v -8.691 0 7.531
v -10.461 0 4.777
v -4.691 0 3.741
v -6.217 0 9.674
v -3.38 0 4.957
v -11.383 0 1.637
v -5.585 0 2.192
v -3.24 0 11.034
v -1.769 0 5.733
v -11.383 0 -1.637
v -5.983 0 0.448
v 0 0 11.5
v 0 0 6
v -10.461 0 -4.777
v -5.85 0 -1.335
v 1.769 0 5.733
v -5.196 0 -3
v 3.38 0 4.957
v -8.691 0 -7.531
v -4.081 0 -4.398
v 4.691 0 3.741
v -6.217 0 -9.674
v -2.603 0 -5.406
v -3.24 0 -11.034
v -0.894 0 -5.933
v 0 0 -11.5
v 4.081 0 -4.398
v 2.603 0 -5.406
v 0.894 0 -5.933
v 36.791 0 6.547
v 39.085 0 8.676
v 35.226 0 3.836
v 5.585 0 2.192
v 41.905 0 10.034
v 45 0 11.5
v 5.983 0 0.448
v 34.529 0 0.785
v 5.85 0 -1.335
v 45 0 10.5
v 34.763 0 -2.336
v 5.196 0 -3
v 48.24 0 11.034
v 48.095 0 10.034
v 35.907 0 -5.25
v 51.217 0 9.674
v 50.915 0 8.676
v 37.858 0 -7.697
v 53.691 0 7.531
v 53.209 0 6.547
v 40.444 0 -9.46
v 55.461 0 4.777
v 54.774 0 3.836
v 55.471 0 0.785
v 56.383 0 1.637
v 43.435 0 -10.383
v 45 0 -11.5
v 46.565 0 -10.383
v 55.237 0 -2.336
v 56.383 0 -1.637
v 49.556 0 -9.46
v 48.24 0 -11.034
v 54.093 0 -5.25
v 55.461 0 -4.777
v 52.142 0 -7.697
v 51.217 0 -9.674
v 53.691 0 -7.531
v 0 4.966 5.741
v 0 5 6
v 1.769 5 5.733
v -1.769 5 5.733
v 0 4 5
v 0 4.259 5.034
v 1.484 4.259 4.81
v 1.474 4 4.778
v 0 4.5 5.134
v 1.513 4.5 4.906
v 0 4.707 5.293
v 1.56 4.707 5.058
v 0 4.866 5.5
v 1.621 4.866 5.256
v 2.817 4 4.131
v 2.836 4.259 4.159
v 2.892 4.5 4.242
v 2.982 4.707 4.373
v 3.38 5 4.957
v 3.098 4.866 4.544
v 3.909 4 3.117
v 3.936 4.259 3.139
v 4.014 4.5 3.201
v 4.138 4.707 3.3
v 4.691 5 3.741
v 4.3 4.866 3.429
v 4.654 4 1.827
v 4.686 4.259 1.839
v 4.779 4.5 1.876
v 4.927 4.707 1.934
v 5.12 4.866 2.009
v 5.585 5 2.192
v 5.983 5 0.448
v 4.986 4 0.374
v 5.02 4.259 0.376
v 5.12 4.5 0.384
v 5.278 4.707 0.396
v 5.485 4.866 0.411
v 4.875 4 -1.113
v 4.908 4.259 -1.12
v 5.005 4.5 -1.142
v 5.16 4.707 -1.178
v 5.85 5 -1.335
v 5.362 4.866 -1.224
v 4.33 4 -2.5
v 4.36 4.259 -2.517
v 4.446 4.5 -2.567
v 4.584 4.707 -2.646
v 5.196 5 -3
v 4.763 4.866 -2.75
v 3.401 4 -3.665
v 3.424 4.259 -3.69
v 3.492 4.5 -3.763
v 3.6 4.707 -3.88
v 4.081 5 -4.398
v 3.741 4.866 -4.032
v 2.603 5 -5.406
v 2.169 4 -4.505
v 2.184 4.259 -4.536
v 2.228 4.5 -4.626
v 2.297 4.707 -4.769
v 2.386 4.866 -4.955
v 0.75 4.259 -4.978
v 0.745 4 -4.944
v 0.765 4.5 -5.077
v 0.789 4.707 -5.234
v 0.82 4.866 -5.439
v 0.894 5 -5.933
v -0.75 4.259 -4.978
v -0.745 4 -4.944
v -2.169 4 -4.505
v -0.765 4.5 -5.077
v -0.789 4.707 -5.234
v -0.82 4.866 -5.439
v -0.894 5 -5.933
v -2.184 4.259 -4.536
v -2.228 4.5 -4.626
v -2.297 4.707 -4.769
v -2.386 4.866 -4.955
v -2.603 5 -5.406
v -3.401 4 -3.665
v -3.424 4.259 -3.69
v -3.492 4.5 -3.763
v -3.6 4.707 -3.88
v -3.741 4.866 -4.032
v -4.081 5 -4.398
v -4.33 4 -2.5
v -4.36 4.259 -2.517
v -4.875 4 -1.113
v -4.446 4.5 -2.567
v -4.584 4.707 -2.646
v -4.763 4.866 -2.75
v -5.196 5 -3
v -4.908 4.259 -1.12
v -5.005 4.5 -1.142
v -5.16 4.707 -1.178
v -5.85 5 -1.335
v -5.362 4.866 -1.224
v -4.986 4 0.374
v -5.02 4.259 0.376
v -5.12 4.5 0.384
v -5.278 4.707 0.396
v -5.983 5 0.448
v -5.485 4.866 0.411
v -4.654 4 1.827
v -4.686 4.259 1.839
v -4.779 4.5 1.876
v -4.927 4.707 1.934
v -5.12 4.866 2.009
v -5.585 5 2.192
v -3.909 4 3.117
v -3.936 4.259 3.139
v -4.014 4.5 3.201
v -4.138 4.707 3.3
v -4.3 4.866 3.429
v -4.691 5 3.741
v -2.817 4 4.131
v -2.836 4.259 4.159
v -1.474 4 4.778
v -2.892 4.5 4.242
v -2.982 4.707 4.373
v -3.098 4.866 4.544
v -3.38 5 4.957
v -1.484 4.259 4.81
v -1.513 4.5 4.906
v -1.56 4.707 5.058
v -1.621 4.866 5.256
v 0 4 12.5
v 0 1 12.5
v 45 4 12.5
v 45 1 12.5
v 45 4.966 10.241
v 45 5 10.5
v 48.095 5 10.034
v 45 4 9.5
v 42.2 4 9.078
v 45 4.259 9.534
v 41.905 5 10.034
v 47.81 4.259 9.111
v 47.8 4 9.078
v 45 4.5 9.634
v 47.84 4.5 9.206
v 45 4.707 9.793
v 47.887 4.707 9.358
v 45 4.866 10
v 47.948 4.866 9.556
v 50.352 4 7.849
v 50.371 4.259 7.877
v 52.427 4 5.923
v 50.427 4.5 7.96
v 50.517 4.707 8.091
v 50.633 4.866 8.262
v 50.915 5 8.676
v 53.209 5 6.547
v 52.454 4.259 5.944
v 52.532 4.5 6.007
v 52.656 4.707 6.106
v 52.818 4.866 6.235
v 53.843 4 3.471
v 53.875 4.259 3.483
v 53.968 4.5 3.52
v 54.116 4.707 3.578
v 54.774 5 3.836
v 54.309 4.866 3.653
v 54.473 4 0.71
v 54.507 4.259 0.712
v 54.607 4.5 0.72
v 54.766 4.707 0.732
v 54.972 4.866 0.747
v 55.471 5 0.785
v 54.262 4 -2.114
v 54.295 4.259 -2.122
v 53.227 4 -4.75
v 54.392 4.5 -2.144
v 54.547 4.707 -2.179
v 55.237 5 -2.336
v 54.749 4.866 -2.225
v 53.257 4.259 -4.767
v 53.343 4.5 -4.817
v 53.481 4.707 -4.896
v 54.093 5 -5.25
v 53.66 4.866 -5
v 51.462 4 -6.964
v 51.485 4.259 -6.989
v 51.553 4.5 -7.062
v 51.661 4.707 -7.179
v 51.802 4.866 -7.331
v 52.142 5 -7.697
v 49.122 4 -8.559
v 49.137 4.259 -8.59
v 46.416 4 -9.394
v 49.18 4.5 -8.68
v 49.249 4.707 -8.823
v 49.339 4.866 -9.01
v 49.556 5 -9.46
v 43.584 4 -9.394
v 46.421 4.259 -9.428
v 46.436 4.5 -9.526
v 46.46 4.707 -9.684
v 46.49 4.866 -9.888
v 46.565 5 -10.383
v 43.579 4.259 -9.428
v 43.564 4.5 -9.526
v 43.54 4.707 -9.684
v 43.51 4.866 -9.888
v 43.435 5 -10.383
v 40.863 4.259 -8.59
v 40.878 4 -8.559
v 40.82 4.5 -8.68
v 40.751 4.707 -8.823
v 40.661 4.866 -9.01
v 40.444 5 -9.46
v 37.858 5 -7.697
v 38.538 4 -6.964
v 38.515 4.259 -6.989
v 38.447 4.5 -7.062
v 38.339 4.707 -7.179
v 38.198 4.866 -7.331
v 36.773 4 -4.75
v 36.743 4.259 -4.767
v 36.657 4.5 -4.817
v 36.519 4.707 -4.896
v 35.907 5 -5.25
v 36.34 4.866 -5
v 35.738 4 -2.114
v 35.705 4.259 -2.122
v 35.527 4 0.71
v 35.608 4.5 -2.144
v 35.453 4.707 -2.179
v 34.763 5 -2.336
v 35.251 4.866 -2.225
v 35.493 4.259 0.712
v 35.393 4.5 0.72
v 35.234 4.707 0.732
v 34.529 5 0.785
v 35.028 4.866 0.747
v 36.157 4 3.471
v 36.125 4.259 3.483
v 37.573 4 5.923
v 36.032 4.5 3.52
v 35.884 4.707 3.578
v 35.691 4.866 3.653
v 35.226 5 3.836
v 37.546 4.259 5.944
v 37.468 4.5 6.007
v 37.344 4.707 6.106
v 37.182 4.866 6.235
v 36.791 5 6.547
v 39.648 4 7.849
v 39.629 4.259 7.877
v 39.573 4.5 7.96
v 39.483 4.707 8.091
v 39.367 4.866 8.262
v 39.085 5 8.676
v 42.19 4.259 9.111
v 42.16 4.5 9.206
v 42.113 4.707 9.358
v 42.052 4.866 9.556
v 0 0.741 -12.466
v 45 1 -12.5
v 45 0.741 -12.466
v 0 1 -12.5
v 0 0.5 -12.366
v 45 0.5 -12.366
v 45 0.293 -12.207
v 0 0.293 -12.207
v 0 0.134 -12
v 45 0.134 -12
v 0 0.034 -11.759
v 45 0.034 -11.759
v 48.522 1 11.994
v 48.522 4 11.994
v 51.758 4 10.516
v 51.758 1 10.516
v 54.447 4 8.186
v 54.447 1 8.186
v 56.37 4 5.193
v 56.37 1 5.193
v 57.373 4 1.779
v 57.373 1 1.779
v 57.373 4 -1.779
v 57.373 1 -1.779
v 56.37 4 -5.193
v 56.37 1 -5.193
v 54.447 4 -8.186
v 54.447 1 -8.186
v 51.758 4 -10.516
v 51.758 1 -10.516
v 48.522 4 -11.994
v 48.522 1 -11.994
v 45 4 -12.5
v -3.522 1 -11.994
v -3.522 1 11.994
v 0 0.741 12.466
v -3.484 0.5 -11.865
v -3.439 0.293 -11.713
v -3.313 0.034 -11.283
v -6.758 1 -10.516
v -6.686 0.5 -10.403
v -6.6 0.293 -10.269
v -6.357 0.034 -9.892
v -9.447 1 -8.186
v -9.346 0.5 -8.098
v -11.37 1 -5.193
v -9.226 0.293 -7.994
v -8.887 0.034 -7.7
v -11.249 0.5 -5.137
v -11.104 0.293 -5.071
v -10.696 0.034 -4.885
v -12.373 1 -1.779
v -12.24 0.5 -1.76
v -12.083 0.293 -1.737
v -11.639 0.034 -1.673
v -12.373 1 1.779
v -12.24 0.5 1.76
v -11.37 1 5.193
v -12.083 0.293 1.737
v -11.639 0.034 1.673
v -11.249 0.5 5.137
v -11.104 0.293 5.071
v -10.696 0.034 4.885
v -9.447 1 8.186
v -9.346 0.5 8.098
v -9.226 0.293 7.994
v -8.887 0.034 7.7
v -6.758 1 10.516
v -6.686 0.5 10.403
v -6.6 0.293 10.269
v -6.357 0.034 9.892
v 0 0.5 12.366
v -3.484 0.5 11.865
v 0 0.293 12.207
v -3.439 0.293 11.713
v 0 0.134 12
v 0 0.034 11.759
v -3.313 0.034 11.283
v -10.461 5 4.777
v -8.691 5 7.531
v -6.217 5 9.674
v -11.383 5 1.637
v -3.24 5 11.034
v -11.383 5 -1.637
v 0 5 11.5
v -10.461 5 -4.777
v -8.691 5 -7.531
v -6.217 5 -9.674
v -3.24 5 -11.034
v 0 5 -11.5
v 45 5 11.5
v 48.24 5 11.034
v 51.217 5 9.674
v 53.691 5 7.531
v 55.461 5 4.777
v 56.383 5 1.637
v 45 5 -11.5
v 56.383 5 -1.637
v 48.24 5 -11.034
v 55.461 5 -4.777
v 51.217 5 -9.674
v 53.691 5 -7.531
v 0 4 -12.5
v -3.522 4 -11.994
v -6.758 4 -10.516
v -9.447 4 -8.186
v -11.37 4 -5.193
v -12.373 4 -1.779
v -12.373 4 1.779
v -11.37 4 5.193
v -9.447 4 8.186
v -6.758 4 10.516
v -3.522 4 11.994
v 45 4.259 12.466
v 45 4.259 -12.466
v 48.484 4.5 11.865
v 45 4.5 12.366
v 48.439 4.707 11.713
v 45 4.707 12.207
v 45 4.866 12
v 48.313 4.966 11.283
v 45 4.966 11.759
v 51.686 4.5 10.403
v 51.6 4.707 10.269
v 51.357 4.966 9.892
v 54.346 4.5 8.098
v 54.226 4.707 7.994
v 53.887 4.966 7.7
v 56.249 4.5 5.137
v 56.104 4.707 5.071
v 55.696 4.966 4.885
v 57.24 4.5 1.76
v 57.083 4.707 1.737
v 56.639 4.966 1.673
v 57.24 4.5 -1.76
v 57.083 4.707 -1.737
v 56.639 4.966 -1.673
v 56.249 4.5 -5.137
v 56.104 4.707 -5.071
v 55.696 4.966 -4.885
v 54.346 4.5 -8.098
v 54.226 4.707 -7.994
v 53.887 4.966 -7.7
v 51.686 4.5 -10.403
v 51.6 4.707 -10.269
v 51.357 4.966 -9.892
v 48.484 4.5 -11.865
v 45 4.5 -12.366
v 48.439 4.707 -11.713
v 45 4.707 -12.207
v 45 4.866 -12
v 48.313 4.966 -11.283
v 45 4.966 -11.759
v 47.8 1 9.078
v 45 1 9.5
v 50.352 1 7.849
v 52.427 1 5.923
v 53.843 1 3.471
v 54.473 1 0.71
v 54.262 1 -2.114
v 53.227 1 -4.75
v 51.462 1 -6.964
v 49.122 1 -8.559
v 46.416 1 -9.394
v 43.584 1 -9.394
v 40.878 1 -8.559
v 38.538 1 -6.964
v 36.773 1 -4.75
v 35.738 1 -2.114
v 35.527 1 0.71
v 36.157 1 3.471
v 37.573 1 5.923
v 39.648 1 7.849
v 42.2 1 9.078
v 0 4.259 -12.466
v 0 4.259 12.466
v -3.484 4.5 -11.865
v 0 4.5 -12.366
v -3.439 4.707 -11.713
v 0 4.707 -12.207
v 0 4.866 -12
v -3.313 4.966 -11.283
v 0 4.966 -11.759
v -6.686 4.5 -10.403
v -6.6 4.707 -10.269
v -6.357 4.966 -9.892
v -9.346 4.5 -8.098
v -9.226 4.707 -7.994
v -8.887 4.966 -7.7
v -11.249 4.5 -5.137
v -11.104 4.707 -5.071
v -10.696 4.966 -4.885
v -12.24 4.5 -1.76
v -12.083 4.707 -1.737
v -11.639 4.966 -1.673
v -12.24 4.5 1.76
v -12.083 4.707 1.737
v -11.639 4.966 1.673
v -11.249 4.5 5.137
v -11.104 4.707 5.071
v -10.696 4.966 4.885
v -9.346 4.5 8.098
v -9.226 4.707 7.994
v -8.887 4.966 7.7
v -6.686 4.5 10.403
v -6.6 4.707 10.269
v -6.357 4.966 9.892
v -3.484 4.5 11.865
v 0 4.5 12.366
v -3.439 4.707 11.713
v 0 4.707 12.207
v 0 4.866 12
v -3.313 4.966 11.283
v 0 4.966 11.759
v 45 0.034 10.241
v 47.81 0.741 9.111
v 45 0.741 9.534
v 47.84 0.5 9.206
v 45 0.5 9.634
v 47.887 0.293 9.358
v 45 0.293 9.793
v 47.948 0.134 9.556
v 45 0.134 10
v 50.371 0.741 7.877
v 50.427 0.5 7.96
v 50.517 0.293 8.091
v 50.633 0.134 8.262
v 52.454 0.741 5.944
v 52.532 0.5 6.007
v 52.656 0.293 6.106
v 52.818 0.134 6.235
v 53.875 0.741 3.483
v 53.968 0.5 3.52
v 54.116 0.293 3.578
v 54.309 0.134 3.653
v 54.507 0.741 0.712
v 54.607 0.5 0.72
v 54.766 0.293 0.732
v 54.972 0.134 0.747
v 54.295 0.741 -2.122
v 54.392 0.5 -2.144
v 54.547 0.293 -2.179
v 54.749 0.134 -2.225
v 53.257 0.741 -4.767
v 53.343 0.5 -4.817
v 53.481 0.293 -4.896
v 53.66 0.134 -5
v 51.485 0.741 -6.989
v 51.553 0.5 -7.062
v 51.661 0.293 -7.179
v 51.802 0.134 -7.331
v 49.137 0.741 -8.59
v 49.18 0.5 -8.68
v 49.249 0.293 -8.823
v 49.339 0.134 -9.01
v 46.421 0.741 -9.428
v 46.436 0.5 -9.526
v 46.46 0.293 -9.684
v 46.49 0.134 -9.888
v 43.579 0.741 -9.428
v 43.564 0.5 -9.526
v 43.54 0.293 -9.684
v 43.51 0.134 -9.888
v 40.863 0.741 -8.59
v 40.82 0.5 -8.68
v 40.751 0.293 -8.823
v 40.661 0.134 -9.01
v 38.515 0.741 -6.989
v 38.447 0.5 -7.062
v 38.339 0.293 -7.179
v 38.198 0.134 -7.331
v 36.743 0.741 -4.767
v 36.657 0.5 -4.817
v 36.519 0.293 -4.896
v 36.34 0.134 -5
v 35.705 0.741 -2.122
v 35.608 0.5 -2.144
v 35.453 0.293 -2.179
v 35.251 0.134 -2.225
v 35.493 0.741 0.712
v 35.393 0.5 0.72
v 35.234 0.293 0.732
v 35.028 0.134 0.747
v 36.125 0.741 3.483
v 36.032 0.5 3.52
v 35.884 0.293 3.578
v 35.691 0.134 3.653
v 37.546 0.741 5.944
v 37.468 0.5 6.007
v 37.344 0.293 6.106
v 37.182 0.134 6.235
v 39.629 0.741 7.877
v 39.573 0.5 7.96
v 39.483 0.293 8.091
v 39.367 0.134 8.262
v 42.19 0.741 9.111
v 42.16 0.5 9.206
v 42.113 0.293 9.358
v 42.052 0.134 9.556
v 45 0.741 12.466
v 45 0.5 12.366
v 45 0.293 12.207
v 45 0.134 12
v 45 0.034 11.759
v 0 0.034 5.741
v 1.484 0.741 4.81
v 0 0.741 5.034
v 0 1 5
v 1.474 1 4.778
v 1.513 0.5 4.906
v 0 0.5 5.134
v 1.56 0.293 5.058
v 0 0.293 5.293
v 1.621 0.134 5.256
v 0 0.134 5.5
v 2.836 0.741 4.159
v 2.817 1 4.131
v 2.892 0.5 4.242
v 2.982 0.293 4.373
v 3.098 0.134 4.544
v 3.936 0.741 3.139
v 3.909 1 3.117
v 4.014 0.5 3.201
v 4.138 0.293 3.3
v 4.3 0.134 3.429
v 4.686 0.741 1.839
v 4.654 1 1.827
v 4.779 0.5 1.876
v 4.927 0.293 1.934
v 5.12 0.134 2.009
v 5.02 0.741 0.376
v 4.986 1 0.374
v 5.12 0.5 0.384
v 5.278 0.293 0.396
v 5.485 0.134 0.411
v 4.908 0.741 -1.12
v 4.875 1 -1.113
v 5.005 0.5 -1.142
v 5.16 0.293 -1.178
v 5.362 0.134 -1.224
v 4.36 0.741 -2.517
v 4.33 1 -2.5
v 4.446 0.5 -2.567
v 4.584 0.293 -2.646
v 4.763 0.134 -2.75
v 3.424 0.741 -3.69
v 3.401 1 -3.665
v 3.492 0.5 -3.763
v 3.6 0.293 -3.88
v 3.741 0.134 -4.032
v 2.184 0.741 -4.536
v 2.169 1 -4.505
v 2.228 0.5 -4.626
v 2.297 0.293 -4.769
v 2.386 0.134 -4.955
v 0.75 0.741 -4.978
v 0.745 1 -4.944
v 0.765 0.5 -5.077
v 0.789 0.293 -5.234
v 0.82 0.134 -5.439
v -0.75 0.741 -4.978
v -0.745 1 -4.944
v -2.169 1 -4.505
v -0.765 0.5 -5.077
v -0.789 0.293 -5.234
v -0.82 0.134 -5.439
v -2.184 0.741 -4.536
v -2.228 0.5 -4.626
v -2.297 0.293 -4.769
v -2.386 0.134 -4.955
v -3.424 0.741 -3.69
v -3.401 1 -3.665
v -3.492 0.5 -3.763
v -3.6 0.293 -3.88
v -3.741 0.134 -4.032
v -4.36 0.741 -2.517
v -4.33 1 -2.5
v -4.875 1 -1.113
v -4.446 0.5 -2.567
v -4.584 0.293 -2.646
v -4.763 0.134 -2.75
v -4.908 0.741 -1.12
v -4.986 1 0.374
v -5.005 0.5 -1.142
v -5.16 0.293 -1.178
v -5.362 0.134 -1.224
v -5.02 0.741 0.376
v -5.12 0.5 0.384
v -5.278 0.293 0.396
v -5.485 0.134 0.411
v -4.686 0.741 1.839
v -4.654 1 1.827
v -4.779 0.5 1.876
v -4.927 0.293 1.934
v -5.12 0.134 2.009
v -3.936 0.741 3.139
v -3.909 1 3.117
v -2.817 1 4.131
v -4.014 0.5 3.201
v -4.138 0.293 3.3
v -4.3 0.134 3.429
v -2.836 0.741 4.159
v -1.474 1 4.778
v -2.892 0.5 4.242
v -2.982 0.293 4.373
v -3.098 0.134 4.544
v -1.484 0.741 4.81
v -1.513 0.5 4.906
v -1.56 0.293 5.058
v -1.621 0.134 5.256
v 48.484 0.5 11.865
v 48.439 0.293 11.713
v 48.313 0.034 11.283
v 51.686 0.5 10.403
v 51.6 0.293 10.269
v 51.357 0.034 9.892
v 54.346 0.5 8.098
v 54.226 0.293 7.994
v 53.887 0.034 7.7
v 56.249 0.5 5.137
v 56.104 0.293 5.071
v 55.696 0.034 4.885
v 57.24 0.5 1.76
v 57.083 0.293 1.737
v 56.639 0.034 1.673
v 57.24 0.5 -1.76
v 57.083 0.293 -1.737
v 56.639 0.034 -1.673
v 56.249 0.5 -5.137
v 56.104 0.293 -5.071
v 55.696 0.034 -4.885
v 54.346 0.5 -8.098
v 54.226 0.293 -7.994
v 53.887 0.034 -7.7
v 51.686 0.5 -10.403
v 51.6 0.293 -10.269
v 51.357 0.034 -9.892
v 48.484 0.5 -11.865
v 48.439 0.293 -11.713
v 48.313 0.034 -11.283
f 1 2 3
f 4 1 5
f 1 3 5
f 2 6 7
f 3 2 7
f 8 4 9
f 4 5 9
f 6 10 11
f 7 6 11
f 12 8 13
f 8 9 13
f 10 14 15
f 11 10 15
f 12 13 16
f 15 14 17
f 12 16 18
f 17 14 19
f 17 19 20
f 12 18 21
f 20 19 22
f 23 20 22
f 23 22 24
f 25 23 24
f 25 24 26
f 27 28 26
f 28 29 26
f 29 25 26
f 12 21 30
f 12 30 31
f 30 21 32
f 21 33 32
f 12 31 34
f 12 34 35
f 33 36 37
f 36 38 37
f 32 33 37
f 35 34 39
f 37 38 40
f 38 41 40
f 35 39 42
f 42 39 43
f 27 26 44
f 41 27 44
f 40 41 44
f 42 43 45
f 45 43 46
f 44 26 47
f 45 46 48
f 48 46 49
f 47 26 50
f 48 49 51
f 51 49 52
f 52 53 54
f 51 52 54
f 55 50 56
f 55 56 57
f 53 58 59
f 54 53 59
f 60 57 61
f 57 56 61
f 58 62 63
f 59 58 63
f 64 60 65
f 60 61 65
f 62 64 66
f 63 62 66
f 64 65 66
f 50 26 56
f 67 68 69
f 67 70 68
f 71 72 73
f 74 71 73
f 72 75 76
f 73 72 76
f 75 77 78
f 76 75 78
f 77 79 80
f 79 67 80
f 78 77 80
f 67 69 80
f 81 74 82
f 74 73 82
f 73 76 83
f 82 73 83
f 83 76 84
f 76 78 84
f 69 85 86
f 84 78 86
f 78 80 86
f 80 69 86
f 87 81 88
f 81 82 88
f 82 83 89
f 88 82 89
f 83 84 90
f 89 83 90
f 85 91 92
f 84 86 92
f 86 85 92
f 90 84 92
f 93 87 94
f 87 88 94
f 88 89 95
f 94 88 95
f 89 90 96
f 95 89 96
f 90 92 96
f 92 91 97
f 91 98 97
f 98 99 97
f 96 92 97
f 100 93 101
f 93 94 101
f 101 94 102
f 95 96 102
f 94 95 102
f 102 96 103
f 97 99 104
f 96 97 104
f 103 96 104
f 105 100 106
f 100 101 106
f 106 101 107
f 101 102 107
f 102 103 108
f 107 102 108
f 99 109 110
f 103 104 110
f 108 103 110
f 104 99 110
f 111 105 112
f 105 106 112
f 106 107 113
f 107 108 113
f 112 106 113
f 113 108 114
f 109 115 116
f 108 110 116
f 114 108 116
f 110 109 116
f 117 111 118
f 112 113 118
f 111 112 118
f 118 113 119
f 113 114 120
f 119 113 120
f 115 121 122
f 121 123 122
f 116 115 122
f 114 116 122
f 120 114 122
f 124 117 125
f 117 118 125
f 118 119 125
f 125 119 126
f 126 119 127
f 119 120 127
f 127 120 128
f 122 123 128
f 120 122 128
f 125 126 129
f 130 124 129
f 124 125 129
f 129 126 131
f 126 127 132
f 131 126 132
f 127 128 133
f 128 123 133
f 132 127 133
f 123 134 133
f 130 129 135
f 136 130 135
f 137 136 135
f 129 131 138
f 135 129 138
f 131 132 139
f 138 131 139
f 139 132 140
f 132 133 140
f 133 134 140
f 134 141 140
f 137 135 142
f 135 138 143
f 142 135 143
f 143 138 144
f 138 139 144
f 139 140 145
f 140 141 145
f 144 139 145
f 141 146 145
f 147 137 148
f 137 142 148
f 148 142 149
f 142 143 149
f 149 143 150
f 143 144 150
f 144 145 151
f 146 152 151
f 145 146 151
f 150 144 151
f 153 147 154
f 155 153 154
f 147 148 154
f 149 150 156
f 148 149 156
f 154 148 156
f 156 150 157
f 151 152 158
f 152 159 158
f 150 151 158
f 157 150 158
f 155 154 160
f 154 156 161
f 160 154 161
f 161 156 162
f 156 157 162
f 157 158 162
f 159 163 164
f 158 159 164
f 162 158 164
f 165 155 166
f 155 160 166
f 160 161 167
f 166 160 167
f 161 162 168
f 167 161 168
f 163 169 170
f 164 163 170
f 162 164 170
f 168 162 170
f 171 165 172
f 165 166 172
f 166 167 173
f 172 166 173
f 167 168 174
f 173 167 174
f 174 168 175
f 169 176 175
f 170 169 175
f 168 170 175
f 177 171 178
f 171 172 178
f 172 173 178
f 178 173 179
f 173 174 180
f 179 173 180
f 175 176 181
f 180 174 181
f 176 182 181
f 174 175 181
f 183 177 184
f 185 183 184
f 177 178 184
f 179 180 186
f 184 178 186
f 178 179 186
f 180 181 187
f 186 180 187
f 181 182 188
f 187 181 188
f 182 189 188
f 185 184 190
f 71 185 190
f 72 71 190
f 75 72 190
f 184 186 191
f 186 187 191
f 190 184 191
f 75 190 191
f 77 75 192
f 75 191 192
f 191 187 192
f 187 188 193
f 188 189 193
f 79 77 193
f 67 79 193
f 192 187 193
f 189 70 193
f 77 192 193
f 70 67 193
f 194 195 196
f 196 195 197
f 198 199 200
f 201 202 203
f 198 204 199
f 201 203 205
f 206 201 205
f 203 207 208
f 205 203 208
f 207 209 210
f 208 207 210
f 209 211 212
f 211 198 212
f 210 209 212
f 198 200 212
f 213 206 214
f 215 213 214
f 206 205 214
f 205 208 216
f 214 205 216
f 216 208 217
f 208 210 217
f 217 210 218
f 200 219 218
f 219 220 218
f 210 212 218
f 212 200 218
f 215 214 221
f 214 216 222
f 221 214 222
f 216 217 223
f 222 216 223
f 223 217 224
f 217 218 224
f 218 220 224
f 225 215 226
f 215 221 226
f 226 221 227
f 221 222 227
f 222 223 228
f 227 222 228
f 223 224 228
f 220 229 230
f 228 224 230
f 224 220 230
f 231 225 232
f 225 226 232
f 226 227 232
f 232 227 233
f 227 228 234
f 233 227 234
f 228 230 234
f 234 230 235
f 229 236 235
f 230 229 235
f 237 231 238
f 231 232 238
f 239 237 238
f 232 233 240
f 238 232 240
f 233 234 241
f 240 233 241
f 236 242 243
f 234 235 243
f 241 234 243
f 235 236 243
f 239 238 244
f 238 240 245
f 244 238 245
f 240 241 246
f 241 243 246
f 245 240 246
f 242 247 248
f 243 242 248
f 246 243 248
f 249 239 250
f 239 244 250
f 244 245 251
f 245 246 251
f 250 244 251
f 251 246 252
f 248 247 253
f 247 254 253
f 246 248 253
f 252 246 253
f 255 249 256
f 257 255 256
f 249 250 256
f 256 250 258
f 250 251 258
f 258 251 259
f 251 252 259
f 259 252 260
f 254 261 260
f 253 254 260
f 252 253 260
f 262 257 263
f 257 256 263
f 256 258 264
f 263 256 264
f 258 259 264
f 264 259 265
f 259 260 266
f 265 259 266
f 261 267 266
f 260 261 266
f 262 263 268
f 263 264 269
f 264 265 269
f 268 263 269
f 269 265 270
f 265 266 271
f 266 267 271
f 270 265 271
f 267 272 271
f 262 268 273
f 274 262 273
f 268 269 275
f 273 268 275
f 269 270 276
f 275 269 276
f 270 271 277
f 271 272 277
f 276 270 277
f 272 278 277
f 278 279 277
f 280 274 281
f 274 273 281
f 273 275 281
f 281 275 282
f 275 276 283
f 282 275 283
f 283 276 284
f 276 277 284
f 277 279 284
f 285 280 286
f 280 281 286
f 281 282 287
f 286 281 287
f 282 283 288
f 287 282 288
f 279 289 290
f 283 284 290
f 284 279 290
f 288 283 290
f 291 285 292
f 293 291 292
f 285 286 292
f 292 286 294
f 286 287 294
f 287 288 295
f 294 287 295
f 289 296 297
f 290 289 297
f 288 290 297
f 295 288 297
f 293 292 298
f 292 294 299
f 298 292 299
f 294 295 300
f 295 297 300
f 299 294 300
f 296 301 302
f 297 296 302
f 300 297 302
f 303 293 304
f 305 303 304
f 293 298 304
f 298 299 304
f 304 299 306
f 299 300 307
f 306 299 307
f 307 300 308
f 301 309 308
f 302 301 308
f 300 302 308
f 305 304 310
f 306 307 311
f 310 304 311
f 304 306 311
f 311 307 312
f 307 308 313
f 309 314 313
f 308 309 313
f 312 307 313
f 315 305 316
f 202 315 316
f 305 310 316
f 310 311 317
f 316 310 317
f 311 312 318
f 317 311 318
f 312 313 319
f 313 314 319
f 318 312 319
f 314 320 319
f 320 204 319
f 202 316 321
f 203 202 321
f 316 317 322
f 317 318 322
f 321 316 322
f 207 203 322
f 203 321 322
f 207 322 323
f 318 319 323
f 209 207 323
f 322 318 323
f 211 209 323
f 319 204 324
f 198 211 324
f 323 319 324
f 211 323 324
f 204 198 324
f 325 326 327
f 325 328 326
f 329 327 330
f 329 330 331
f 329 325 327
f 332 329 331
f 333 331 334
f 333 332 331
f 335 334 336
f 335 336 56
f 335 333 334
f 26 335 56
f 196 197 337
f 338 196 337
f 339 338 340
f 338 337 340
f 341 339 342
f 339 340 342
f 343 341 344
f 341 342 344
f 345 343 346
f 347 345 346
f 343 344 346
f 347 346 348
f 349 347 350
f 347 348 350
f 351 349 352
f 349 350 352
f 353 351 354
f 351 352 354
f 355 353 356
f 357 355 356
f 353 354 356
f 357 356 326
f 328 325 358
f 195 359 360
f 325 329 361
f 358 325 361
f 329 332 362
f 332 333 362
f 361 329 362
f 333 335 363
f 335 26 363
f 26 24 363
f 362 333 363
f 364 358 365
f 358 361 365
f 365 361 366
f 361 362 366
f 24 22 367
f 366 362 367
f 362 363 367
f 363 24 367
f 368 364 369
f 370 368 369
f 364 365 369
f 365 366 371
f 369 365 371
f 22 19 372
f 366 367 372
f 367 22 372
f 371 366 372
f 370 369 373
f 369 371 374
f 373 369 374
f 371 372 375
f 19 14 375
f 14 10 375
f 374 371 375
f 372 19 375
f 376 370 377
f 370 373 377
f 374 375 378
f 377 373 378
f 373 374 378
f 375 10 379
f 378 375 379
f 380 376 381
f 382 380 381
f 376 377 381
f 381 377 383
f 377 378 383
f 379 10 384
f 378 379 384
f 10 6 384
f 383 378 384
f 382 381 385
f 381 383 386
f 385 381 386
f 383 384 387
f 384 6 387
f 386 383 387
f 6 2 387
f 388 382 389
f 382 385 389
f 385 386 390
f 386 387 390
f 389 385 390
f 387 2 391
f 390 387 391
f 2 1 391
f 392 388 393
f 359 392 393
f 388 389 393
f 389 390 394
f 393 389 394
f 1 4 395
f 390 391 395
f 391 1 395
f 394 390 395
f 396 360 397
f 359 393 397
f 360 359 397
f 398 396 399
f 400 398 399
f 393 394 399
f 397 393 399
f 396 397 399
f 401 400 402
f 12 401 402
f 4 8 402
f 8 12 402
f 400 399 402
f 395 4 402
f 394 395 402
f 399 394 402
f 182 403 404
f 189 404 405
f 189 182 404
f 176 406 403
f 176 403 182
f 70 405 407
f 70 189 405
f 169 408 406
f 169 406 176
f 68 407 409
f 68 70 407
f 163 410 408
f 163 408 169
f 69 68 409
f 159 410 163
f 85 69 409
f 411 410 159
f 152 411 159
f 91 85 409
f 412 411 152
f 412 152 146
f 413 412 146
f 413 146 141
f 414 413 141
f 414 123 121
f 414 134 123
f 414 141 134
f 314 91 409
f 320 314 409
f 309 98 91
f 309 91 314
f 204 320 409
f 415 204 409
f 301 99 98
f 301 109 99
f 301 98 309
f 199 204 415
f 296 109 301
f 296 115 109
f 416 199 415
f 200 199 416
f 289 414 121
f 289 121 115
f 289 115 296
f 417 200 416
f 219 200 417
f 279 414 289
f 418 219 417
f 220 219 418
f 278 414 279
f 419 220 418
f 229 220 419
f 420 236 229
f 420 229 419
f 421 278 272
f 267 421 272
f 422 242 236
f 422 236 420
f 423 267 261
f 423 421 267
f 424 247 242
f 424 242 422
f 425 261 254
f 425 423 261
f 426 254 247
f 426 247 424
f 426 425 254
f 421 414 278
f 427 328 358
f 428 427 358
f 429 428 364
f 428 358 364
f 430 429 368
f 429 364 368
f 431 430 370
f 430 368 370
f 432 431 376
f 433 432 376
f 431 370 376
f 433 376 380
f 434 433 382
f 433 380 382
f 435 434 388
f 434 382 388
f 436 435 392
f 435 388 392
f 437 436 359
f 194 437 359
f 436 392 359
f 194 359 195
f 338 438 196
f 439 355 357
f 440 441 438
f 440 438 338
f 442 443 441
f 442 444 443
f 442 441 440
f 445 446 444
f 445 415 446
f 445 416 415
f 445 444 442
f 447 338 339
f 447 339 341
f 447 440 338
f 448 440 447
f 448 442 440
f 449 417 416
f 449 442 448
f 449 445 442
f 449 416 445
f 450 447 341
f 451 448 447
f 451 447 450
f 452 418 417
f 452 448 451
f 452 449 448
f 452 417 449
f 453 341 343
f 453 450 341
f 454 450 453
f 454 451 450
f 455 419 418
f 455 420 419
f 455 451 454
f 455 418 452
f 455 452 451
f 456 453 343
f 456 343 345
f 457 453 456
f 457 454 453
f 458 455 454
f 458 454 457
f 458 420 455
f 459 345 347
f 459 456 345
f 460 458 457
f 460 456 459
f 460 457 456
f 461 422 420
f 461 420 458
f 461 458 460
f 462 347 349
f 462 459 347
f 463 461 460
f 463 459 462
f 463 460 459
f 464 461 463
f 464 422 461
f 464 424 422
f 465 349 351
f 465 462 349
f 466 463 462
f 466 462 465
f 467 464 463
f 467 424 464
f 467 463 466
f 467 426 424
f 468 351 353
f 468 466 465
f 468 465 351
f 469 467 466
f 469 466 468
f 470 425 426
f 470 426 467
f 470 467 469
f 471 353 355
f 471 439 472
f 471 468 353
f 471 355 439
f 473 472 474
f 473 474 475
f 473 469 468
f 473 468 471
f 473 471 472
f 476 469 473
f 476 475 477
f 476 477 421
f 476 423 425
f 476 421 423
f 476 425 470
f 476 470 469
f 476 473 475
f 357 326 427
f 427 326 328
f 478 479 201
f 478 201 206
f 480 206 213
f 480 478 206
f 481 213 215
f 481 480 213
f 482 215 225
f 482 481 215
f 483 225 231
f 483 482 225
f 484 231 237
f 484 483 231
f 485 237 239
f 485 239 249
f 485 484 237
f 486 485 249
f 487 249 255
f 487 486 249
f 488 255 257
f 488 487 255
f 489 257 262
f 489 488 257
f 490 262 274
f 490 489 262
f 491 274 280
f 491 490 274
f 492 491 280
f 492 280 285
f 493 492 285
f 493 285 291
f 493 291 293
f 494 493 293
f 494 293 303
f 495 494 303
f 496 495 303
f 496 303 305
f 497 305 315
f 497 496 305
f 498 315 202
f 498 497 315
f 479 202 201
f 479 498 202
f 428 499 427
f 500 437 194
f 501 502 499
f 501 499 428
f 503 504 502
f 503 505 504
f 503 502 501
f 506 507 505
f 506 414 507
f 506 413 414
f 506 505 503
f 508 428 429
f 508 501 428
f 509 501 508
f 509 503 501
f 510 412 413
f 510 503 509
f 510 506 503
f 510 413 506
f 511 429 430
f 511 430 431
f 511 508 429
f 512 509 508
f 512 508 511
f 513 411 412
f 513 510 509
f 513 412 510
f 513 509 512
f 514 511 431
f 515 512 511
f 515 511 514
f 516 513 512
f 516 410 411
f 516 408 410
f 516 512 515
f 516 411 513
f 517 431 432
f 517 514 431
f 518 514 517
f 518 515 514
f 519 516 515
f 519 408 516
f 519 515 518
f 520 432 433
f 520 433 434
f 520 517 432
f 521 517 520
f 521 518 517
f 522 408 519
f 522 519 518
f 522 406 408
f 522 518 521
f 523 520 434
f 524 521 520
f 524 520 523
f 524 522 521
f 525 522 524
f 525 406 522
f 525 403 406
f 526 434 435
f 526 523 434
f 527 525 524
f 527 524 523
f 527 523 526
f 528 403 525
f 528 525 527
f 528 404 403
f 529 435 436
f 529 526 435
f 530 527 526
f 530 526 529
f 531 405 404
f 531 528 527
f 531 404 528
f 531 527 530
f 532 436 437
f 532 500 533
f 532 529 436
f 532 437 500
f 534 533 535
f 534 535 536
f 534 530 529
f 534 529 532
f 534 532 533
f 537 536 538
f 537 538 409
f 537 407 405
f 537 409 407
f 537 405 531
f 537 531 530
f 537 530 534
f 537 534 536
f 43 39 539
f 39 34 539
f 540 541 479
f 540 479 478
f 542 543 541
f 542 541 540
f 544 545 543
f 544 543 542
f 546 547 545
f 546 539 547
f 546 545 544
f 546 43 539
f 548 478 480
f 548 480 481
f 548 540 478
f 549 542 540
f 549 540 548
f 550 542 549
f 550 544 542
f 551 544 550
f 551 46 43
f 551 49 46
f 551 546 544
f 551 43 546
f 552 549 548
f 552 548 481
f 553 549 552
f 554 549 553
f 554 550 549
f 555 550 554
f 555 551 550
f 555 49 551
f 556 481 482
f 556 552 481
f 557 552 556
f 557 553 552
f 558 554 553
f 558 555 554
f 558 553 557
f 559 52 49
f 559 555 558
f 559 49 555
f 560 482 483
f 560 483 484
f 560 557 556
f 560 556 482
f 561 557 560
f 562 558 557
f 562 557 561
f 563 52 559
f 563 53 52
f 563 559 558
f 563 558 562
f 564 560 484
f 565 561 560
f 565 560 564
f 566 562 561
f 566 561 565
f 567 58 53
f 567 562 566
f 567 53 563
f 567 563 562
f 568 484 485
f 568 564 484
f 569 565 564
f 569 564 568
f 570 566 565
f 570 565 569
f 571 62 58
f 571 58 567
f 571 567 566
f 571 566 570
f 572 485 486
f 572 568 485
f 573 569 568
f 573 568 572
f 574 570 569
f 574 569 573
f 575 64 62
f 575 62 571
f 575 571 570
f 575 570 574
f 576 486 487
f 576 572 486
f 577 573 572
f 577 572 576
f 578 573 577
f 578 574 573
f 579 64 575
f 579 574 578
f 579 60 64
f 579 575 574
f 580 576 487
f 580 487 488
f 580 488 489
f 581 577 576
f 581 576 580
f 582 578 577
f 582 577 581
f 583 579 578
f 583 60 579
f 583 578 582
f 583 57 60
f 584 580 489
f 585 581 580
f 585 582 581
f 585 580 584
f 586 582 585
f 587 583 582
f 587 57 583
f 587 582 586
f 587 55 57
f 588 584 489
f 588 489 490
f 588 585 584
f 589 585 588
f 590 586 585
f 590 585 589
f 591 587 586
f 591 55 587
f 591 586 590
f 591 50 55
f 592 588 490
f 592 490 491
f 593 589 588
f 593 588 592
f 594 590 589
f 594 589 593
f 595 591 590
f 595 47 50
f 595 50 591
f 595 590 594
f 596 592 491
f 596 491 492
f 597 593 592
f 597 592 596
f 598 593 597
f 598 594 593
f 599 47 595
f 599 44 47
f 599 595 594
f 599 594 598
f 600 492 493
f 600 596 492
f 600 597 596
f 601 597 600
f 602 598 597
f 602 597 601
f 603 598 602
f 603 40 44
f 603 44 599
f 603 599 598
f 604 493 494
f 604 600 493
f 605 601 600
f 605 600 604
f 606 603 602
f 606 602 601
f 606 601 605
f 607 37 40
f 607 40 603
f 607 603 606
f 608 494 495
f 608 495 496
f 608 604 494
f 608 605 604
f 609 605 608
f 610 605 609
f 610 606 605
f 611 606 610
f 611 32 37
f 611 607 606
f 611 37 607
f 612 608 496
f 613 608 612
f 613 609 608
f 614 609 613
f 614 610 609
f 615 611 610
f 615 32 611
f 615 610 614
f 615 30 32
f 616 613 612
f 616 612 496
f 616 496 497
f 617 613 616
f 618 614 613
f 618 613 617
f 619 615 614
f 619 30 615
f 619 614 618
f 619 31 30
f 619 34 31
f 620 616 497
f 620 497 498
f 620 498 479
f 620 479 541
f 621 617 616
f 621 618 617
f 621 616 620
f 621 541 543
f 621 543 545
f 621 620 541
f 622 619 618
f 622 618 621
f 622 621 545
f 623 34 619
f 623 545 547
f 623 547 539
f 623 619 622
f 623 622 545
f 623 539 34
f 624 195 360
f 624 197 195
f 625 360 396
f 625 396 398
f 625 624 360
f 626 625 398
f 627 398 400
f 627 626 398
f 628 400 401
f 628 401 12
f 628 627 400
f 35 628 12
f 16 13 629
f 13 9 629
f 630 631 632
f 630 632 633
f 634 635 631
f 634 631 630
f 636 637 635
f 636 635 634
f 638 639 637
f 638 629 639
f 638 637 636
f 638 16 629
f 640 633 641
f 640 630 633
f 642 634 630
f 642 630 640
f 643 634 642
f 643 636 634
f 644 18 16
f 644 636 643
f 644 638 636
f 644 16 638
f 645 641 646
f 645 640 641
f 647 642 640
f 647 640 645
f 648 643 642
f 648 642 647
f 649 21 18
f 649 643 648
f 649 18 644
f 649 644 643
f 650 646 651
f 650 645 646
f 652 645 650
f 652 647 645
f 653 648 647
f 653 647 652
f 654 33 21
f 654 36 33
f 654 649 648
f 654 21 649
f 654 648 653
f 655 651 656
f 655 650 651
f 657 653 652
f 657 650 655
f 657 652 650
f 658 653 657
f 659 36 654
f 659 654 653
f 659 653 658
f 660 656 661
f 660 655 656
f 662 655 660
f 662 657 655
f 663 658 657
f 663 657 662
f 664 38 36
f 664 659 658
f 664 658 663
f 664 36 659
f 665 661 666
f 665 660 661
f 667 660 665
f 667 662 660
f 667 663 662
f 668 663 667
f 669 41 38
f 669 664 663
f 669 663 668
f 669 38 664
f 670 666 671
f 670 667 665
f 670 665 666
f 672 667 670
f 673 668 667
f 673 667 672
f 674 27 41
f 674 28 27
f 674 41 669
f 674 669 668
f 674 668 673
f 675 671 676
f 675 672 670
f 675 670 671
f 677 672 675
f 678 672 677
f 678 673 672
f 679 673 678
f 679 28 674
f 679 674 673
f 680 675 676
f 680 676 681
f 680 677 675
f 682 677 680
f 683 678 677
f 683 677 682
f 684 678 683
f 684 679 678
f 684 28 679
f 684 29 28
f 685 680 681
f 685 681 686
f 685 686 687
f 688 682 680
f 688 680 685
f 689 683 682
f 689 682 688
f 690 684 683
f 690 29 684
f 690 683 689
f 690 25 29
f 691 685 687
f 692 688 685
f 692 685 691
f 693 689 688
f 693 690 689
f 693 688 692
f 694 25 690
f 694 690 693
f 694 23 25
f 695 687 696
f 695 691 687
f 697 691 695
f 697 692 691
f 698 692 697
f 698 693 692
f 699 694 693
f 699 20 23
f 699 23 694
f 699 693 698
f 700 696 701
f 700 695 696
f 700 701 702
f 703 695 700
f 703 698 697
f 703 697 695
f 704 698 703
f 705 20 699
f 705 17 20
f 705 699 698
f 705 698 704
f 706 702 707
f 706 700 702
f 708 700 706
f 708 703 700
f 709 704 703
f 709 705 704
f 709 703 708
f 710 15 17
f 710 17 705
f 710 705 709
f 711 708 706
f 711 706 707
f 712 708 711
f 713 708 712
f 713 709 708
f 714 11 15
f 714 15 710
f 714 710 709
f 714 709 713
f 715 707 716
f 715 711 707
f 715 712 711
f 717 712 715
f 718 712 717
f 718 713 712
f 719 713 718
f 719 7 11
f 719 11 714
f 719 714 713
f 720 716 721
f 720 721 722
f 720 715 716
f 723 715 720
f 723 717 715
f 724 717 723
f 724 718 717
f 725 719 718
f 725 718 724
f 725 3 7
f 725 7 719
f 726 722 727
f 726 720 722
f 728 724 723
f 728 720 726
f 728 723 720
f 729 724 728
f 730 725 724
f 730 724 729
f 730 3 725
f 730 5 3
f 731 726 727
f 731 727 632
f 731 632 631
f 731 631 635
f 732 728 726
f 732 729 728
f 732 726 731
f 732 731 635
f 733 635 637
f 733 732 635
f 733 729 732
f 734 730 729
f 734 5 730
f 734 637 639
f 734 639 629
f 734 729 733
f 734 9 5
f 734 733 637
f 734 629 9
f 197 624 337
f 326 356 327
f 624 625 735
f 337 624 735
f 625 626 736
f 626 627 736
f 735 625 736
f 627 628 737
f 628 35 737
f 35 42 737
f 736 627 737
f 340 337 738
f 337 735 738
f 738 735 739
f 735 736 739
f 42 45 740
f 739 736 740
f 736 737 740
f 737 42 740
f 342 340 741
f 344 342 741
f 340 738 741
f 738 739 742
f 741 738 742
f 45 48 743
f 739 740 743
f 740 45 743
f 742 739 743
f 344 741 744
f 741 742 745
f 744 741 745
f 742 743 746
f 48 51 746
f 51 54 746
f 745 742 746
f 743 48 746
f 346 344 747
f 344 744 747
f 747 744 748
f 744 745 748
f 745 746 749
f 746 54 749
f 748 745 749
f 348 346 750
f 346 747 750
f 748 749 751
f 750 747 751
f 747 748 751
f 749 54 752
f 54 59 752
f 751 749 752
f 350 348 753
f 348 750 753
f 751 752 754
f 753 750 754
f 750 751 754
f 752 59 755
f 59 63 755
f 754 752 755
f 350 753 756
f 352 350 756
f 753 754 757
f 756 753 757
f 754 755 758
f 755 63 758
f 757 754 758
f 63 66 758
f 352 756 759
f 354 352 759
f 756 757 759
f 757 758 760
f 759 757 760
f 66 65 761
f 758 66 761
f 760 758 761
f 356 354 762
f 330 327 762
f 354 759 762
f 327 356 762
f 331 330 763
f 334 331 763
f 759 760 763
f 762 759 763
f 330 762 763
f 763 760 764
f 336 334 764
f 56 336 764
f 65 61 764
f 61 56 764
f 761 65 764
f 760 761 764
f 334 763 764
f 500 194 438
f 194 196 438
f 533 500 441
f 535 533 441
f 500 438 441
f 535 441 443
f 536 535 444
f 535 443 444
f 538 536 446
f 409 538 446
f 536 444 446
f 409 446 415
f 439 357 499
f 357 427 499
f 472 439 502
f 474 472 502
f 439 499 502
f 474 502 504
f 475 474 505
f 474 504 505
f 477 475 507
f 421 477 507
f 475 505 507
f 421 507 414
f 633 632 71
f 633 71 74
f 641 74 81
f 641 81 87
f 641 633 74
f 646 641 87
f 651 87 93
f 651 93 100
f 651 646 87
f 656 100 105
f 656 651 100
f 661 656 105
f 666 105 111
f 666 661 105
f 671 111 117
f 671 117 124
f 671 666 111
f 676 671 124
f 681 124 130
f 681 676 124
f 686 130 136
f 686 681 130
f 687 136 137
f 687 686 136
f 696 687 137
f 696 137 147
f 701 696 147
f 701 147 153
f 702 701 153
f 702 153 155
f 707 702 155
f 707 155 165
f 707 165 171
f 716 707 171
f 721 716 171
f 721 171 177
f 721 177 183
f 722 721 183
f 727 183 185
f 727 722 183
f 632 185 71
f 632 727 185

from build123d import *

# Parameters (mm, degrees)
SKETCH1_R           = 5
SKETCH1_R_2         = 9.5
BOSS_EXTRUDE1_DEPTH = 5
FILLET1_R           = 1


with BuildPart() as part:
    # Sketch1 → Boss-Extrude1 (new body)
    with BuildSketch(Plane(origin=(0, 0, 0), x_dir=(1, 0, 0), z_dir=(0, 1, 0))):
        with BuildLine():
            Line((45, 12.5), (0, 12.5))
            ThreePointArc((0, 12.5), (-12.5, 0), (0, -12.5))
            Line((0, -12.5), (45, -12.5))
            ThreePointArc((45, -12.5), (57.5, 0), (45, 12.5))
        make_face()
        with Locations(Location((0, 0, 0), (0, 0, 270))):
            Circle(SKETCH1_R, mode=Mode.SUBTRACT)
        with Locations(Location((45, 0, 0), (0, 0, 270))):
            Circle(SKETCH1_R_2, mode=Mode.SUBTRACT)
    extrude(amount=BOSS_EXTRUDE1_DEPTH)

    # Fillet1
    fillet1_edges = [part.edges().sort_by_distance(p)[0] for p in [
        (0, 0, -5),
        (0, 5, -5),
        (-12.5, 5, 0),
        (45, 0, -9.5),
        (45, 5, -9.5),
        (22.5, 5, 12.5),
        (57.5, 5, 0),
        (22.5, 0, 12.5),
        (-12.5, 0, 0),
        (22.5, 0, -12.5),
        (57.5, 0, 0),
        (22.5, 5, -12.5),
    ]]
    fillet(fillet1_edges, radius=FILLET1_R)


solid = part.part
